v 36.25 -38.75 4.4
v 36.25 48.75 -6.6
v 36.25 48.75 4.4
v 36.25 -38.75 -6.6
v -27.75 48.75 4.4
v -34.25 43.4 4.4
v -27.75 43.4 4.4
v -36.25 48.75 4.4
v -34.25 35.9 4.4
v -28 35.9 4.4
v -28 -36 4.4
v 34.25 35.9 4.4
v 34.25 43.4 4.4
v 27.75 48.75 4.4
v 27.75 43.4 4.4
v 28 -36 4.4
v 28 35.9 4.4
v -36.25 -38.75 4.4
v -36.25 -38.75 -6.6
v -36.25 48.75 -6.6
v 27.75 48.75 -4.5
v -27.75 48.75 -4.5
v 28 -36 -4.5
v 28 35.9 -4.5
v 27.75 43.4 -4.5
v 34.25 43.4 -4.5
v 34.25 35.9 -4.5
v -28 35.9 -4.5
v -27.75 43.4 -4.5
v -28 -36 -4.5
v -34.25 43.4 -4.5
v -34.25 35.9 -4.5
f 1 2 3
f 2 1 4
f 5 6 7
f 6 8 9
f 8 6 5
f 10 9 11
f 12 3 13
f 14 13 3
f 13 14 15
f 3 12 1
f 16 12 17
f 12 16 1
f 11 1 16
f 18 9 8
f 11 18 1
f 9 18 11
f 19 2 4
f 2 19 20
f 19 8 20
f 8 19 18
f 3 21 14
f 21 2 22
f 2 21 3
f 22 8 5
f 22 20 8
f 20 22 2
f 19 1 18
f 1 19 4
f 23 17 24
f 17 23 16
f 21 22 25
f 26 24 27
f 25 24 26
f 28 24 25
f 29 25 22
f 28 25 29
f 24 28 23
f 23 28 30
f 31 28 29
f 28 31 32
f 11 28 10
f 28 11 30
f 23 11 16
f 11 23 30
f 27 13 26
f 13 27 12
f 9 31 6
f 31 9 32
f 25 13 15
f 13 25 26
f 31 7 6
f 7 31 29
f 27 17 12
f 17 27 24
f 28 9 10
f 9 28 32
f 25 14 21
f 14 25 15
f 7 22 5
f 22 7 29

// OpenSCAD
PCBWidth=50+6; // +2 for the overhanging wires
PCBLength=72;
PCBHeight=22;

ModemHeight=12;
ModemWidth=25;
ModemDepth=48;

Slop=0.5;
ConWingWidth=68+Slop;
ConWingDepth=7+Slop;
ConHeight=9;
ConHeadWidth=55+Slop;
ConHeadDepth=13+Slop;

difference() {
	// Draw the case
	translate([0,5,-1.1])
	color("Green",0.25)
	cube([ConWingWidth+4,PCBLength+ConHeadDepth+2,ConHeight+2],center=true);


	// Draw the PCB
	translate([0,0,-ConHeight/2+PCBHeight/2])
	cube([PCBWidth,PCBLength,PCBHeight],center=true);

	// Draw the connector
	// ----Draw the connector wing
	translate([0,PCBLength/2+ConWingDepth/2-0.1,0])
	cube([ConWingWidth,ConWingDepth,ConHeight],center=true);
	// ----Draw the connector head
	translate([0,PCBLength/2+ConHeadDepth/2-0.1,0])
	cube([ConHeadWidth,ConHeadDepth,ConHeight],center=true);
}
